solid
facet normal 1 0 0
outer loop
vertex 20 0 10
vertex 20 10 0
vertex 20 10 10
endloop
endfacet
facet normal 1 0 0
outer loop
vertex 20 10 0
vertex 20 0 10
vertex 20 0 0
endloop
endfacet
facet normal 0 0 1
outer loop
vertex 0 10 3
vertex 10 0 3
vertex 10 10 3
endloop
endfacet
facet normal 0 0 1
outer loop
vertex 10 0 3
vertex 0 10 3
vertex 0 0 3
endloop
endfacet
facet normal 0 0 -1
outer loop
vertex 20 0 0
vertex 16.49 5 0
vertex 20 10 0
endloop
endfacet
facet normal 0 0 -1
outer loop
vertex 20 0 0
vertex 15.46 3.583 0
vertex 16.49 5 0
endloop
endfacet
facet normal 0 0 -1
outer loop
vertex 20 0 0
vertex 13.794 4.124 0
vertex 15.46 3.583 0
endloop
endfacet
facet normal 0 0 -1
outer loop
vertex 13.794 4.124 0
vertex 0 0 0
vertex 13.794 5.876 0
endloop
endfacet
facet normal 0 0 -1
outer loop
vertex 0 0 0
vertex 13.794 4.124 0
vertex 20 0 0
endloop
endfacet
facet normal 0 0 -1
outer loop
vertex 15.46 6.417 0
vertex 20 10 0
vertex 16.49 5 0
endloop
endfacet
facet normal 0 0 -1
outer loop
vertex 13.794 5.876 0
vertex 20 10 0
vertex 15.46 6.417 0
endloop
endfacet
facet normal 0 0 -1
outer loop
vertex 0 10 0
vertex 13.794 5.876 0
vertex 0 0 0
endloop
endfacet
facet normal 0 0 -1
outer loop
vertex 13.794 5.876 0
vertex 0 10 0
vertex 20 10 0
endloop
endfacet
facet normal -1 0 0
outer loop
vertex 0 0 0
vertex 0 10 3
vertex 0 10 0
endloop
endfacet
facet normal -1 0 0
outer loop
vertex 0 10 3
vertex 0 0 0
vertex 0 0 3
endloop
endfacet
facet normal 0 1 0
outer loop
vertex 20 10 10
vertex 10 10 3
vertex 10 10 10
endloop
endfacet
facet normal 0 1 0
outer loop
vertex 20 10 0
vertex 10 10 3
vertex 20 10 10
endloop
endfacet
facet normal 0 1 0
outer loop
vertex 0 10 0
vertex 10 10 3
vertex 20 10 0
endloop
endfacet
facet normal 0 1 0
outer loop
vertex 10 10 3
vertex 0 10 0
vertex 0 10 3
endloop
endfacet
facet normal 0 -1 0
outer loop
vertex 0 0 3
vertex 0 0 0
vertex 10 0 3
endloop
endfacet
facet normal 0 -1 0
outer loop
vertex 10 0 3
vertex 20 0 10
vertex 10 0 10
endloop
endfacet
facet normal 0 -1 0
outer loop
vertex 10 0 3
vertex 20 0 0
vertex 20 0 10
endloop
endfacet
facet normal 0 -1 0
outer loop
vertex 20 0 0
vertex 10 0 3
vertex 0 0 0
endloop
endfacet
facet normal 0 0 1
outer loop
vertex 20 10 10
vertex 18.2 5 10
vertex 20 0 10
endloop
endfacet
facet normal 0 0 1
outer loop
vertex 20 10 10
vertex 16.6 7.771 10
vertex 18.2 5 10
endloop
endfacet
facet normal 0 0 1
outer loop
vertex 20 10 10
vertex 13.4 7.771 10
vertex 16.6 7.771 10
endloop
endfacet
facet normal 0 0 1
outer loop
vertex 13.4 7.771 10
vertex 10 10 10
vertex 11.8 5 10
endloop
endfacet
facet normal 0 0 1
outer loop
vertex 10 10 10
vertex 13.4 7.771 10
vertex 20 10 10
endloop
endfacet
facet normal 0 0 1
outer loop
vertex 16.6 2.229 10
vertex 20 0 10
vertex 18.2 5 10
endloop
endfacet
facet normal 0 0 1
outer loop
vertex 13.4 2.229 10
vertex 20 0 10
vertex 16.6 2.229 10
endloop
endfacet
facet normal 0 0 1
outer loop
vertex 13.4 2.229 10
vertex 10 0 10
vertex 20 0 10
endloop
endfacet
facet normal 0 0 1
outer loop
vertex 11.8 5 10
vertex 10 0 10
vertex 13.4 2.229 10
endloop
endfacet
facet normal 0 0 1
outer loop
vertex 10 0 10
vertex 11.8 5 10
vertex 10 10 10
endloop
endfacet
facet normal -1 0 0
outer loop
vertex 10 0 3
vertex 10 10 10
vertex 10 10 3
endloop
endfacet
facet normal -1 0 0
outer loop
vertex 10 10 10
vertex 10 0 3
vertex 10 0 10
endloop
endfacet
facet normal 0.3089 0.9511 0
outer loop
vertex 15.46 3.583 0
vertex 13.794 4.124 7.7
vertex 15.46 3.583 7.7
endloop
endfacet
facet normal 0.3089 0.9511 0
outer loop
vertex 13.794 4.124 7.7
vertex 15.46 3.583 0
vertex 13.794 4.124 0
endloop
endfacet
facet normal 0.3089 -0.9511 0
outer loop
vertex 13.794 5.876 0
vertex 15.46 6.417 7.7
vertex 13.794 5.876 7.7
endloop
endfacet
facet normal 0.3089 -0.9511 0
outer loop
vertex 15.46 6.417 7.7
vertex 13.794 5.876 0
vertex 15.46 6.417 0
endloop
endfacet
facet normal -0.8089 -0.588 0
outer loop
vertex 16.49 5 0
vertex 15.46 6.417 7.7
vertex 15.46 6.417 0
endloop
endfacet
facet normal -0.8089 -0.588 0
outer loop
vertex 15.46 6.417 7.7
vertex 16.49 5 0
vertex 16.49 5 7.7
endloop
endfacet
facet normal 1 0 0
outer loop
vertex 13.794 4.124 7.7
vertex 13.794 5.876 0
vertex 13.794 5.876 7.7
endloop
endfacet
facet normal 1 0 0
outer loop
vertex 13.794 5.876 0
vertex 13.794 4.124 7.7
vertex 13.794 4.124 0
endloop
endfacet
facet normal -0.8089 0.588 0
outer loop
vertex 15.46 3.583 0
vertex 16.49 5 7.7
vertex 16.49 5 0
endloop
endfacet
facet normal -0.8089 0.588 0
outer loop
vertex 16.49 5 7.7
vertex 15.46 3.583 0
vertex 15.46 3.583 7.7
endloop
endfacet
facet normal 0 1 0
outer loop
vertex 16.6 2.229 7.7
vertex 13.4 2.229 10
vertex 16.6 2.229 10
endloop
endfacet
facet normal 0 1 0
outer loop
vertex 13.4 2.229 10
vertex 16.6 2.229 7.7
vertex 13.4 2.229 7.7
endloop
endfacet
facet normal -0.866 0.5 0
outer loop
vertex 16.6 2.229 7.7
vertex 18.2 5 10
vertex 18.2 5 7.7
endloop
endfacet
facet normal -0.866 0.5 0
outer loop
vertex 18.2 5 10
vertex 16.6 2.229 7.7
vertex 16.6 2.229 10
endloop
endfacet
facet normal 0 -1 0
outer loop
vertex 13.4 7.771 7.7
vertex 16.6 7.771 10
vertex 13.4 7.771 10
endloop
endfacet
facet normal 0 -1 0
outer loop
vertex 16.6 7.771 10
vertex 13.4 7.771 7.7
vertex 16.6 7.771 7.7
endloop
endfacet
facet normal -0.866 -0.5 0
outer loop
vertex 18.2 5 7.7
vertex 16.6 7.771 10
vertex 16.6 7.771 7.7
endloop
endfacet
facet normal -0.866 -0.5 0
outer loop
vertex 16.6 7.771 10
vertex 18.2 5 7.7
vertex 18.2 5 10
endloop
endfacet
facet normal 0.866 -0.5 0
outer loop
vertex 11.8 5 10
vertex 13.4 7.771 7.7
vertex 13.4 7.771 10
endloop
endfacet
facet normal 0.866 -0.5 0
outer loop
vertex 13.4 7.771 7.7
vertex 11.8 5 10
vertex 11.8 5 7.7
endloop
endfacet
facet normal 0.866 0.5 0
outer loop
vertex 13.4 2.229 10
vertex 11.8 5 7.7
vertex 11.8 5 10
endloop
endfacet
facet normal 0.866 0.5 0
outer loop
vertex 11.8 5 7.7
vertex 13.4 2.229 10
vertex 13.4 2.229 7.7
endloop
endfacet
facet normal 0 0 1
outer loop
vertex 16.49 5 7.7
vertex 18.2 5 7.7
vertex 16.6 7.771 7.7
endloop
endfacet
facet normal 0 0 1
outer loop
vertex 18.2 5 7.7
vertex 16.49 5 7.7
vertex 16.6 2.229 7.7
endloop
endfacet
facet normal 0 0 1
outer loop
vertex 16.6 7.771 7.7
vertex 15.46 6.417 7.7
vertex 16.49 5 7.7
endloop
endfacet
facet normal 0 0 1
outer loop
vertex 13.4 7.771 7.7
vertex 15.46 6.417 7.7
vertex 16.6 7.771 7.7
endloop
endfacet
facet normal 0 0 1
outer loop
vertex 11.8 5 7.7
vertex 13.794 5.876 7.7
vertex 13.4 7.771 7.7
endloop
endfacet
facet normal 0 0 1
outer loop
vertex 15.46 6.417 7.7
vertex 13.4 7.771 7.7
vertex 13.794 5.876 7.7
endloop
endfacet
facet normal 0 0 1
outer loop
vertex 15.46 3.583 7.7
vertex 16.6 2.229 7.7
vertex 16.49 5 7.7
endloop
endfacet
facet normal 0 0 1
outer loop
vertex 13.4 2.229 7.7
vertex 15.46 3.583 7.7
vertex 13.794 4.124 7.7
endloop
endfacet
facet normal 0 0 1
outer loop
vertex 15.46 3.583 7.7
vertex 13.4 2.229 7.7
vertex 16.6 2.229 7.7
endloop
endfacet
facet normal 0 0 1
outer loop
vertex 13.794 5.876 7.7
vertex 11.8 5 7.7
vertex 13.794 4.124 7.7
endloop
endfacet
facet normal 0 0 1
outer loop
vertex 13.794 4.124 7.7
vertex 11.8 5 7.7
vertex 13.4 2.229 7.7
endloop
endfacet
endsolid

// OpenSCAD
// This is my adjustable z-axis mechanical endstop.

use <MCAD/nuts_and_bolts.scad>;
include <MCAD/nuts_and_bolts.scad>;
// It comes from the problem that I don't have a good way to adjust the Z-axis
// but it needs to be really accurate.
// The default prusa one keeps moving about.

// This one will have a longer length of clamp on the rod so that it can be
// fixed and then use a screw above to adjust the level to a finer level.

rod_radius = 8 / 2;
wall_thickness = 3;
clip_length = 20;
bolt_size = 3;
nut_space = 5;
switch_length = 30;
switch_nut_sep_x = 22.2;
switch_nut_sep_y = 10.3;

// 1.5 - 3.3 15.85
// 1.3 kkk
// Model: Contact_Plate
// This model is just a simple plate that glues onto the side of the Y-Axis
// holder and has a screw that points down to make contact with the switch below
// It has a single hole that you should glue in a locking nut
module contact_plate () {
  difference () {
    union () {
      cube ([20, 10, 3]);
      translate ([10, 0, 0]) {
        cube ([10, 10, 10]);
      }
    }
    translate ([15, 5, -0.1]) {
        translate ([0,0,7.8]) {
          nutHole (size=3);
        }
      boltHole (size=3, length=15);
    }
  }

}

module switchHolder () {
  holder_height = switch_nut_sep_y + (2 * nut_space);

  difference () { 
    cube ([switch_length + rod_radius + nut_space, wall_thickness * 2, holder_height]);
    translate ([nut_space, -1, nut_space]) {
      rotate([90,0,180]) { boltHole( length=wall_thickness * 3, size=bolt_size); }
    }
    translate ([nut_space + switch_nut_sep_x , -1, nut_space + switch_nut_sep_y]) {
      rotate([90,0,180]) { boltHole( length=wall_thickness * 3, size=bolt_size); }
    }
    translate ([nut_space, -0.1, nut_space]) {
      rotate([90,0,180]) { nutHole( length=wall_thickness * 3, size=bolt_size); }
    }
    translate ([nut_space + switch_nut_sep_x , -0.1, nut_space + switch_nut_sep_y]) {
      rotate([90,0,180]) { nutHole( length=wall_thickness * 3, size=bolt_size); }
    }
  }

}

module endstopHolder () {
  nut_width = METRIC_NUT_AC_WIDTHS[bolt_size];
  outer_radius = rod_radius + wall_thickness;
  plate_width = rod_radius + nut_space + nut_width + nut_space;
  bolt_length = 2 * ( rod_radius ) + 2 * wall_thickness;
  bolt_width = SE_METRIC_BOLT_MAJOR_THREAD_DIAMETERS[bolt_size]; 
  bolt_offset = rod_radius + nut_space +nut_width/2;
  switch_x_offset = switch_length + nut_space + rod_radius;
  difference () {
    union () {
      cylinder (h=clip_length, r=outer_radius);
      translate ([0, - outer_radius, 0]) {
        cube ([plate_width, outer_radius * 2, clip_length]);
      }
      translate ([- switch_x_offset, rod_radius - wall_thickness, 0]) {
        switchHolder ();
      }
    }
    // Rod cutout
    translate ([0, 0, -0.1]) {
        cylinder (h=clip_length + 5, r=rod_radius);
    }
    // Space
    translate ([0, -rod_radius * 0.6, -0.1]) {
      cube ([plate_width + 0.2, rod_radius * 1.2, clip_length + 0.2]);
    }
    // Now the bolt holes
    translate ([bolt_offset, rod_radius +3.61, nut_space]) {
      rotate([90,0,0]) { boltHole( length=bolt_length, size=bolt_size); }
    }
    translate ([bolt_offset, rod_radius +3.61, clip_length - nut_space]) {
      rotate([90,0,0]) { boltHole( length=bolt_length, size=bolt_size); }
    }
    translate ([bolt_offset, - (rod_radius + 0.61), nut_space]) {
      rotate([90,0,0]) { nutHole( size=bolt_size); }
    }
    translate ([bolt_offset, - (rod_radius + 0.61), clip_length - nut_space]) {
      rotate([90,0,0]) { nutHole( size=bolt_size); }
    }
  }

}

// endstopHolder();

contact_plate();
